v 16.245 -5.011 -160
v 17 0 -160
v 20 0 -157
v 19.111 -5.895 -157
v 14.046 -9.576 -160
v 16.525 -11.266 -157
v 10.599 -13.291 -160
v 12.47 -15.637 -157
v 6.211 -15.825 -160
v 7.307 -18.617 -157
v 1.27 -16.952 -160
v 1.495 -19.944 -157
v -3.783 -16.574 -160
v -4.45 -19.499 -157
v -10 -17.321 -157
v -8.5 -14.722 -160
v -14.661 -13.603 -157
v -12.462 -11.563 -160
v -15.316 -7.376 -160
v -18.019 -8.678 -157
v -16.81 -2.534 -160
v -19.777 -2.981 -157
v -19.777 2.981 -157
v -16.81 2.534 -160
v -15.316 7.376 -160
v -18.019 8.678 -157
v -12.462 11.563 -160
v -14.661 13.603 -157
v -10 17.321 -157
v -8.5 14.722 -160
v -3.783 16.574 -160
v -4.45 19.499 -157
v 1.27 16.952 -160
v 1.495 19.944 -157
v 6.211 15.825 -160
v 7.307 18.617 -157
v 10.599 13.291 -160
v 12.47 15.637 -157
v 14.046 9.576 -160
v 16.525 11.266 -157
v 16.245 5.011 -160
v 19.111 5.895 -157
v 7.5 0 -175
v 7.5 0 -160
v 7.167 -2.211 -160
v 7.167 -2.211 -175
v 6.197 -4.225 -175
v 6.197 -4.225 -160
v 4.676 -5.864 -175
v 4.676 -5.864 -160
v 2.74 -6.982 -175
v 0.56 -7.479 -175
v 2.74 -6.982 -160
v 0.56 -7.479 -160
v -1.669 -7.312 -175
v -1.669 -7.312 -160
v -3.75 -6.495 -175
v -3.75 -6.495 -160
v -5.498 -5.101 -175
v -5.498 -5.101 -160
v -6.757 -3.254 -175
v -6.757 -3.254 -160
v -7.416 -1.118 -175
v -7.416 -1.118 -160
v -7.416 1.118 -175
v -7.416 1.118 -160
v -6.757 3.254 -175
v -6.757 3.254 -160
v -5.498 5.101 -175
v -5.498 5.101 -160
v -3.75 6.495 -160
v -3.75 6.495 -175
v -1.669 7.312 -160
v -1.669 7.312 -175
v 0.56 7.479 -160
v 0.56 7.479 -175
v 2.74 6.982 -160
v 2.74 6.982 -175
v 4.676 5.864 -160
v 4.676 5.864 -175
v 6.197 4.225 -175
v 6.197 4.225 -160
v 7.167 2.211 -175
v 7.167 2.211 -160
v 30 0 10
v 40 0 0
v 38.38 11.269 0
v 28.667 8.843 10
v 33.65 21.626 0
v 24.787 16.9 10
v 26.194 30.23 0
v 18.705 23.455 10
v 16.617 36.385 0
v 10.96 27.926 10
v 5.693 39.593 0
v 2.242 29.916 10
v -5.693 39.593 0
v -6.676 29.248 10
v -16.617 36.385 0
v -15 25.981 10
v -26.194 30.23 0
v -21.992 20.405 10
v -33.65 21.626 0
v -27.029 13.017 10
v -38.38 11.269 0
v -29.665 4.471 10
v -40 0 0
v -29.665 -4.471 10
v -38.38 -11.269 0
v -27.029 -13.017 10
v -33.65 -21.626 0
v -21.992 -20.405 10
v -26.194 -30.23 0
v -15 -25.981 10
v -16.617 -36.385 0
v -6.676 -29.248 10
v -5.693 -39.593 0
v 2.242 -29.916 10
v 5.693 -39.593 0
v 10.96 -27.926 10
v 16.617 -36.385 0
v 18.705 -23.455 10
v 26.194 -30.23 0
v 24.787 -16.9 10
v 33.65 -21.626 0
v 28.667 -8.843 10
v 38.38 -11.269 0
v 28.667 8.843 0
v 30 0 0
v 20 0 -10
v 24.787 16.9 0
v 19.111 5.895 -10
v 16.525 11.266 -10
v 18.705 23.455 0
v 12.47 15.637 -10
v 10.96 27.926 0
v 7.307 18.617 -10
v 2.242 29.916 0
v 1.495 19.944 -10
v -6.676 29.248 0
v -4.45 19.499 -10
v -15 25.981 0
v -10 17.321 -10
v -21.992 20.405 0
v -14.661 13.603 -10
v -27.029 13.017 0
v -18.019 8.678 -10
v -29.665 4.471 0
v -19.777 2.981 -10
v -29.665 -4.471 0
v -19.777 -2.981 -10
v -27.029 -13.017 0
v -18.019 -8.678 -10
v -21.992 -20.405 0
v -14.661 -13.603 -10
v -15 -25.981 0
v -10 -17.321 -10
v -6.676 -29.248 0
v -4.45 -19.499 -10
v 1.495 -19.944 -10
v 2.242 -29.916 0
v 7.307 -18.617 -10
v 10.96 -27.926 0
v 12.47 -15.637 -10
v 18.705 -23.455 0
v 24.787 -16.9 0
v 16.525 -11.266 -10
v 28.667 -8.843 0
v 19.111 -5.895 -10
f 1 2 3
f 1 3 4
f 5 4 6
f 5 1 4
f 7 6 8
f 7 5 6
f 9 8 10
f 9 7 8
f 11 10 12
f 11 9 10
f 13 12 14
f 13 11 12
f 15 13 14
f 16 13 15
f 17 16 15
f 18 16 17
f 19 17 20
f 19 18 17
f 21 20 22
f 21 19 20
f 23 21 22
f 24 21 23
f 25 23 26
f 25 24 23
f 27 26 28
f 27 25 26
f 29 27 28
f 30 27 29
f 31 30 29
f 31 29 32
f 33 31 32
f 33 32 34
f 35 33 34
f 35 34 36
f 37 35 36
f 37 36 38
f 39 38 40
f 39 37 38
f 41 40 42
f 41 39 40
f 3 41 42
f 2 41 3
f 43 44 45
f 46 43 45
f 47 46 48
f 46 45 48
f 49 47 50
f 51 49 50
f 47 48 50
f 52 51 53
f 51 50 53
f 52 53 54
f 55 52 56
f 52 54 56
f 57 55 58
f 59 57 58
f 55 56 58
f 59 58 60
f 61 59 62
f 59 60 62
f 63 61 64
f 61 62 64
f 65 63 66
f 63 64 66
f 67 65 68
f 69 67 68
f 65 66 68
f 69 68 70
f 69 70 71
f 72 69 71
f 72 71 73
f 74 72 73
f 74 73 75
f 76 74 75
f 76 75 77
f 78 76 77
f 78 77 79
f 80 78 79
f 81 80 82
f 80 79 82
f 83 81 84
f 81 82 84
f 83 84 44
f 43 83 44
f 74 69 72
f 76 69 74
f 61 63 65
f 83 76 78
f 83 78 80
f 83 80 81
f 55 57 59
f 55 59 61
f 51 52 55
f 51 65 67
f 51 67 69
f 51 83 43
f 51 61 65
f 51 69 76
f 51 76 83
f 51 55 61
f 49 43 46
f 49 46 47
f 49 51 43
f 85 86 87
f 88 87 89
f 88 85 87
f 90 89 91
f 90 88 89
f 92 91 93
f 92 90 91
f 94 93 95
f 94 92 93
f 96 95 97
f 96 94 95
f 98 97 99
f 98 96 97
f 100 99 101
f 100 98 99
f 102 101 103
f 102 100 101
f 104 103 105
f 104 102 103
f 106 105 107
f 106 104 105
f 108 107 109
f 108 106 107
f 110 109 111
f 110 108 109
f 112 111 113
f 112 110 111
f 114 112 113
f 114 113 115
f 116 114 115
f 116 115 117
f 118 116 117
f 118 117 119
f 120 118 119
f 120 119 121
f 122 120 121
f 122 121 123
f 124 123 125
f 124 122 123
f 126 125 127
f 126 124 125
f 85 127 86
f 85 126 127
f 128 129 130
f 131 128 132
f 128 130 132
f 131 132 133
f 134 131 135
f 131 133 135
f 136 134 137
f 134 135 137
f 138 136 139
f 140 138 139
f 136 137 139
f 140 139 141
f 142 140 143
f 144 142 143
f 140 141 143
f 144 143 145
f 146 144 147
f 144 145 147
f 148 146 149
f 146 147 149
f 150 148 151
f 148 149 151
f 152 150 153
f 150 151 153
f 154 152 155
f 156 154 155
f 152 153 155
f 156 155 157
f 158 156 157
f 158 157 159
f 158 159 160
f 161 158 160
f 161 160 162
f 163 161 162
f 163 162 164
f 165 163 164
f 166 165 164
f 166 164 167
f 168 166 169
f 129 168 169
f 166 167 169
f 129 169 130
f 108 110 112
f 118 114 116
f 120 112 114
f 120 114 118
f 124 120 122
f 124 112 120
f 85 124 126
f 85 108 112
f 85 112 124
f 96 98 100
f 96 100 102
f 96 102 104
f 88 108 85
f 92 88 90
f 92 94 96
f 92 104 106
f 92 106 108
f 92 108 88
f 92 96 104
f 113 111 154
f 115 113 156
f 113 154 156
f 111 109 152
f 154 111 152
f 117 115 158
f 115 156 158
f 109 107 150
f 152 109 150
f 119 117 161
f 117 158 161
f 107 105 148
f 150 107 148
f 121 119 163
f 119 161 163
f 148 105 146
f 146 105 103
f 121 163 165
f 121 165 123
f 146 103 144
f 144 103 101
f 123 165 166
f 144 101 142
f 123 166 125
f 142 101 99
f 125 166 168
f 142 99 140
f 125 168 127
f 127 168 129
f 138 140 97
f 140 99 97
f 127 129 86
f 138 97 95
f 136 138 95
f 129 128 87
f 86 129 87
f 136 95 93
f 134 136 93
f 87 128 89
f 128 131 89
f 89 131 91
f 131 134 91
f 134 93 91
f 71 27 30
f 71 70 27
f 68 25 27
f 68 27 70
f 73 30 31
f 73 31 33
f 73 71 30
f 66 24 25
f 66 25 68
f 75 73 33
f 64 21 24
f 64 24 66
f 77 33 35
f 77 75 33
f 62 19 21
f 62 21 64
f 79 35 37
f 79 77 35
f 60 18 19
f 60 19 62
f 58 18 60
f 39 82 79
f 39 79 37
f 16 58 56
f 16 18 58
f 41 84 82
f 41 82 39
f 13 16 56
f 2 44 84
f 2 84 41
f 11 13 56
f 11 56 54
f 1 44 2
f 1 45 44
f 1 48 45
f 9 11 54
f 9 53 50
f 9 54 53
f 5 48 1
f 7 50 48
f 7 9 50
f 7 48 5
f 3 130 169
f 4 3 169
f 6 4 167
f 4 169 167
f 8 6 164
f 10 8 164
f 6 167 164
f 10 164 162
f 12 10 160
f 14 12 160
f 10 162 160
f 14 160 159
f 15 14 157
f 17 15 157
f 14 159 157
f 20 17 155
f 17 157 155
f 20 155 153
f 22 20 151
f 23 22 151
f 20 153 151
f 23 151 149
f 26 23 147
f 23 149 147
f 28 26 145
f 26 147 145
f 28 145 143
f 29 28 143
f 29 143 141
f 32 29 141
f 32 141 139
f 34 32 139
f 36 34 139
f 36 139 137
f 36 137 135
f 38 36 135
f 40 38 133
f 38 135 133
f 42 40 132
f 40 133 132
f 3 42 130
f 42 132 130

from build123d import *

# Parameters (mm, degrees)
F0_R     = 40
F1_DEPTH = 10
F2_R     = 30
F3_DEPTH = 10
F4_R     = 20
F5_DEPTH = 150
F6_R     = 7.5
F7_DEPTH = 15
F8_SIZE2 = 9.99999
F8_SIZE  = 9.99999
F9_SIZE  = 9.99999
F10_SIZE = 3


# Not quite as in the source:
# - a fillet or chamfer is up to 0.001 mm smaller than in the source, because OpenCascade refuses the exact size


with BuildPart() as f1:
    # F0 (on Top) → F1 (new body)
    with BuildSketch(Plane.XY):
        Circle(F0_R)
    extrude(amount=F1_DEPTH)

    # F2 (on Top) → F3 (join)
    with BuildSketch(Plane.XY):
        Circle(F2_R)
    extrude(amount=-F3_DEPTH)

    # F4 (on face) → F5 (join)
    with BuildSketch(Plane(origin=(0, 0, -10), x_dir=(1, 0, 0), z_dir=(0, 0, -1))):
        Circle(F4_R)
    extrude(amount=F5_DEPTH)

    # F6 (on face) → F7 (join)
    with BuildSketch(Plane(origin=(0, 0, -160), x_dir=(1, 0, 0), z_dir=(0, 0, -1))):
        Circle(F6_R)
    extrude(amount=F7_DEPTH)

    # F8 (size 10 and 10 in the source; OpenCascade refuses exactly that, so slightly less here)
    f8_edges = [f1.edges().sort_by_distance(p)[0] for p in [
        (-40, 0, 10),
    ]]
    chamfer(f8_edges, length=F8_SIZE, length2=F8_SIZE2)

    # F9 (size 10 in the source; OpenCascade refuses exactly that, so slightly less here)
    f9_edges = [f1.edges().sort_by_distance(p)[0] for p in [
        (-30, 0, -10),
    ]]
    chamfer(f9_edges, length=F9_SIZE)

    # F10
    f10_edges = [f1.edges().sort_by_distance(p)[0] for p in [
        (-20, 0, -160),
    ]]
    chamfer(f10_edges, length=F10_SIZE)


solid = f1.part
